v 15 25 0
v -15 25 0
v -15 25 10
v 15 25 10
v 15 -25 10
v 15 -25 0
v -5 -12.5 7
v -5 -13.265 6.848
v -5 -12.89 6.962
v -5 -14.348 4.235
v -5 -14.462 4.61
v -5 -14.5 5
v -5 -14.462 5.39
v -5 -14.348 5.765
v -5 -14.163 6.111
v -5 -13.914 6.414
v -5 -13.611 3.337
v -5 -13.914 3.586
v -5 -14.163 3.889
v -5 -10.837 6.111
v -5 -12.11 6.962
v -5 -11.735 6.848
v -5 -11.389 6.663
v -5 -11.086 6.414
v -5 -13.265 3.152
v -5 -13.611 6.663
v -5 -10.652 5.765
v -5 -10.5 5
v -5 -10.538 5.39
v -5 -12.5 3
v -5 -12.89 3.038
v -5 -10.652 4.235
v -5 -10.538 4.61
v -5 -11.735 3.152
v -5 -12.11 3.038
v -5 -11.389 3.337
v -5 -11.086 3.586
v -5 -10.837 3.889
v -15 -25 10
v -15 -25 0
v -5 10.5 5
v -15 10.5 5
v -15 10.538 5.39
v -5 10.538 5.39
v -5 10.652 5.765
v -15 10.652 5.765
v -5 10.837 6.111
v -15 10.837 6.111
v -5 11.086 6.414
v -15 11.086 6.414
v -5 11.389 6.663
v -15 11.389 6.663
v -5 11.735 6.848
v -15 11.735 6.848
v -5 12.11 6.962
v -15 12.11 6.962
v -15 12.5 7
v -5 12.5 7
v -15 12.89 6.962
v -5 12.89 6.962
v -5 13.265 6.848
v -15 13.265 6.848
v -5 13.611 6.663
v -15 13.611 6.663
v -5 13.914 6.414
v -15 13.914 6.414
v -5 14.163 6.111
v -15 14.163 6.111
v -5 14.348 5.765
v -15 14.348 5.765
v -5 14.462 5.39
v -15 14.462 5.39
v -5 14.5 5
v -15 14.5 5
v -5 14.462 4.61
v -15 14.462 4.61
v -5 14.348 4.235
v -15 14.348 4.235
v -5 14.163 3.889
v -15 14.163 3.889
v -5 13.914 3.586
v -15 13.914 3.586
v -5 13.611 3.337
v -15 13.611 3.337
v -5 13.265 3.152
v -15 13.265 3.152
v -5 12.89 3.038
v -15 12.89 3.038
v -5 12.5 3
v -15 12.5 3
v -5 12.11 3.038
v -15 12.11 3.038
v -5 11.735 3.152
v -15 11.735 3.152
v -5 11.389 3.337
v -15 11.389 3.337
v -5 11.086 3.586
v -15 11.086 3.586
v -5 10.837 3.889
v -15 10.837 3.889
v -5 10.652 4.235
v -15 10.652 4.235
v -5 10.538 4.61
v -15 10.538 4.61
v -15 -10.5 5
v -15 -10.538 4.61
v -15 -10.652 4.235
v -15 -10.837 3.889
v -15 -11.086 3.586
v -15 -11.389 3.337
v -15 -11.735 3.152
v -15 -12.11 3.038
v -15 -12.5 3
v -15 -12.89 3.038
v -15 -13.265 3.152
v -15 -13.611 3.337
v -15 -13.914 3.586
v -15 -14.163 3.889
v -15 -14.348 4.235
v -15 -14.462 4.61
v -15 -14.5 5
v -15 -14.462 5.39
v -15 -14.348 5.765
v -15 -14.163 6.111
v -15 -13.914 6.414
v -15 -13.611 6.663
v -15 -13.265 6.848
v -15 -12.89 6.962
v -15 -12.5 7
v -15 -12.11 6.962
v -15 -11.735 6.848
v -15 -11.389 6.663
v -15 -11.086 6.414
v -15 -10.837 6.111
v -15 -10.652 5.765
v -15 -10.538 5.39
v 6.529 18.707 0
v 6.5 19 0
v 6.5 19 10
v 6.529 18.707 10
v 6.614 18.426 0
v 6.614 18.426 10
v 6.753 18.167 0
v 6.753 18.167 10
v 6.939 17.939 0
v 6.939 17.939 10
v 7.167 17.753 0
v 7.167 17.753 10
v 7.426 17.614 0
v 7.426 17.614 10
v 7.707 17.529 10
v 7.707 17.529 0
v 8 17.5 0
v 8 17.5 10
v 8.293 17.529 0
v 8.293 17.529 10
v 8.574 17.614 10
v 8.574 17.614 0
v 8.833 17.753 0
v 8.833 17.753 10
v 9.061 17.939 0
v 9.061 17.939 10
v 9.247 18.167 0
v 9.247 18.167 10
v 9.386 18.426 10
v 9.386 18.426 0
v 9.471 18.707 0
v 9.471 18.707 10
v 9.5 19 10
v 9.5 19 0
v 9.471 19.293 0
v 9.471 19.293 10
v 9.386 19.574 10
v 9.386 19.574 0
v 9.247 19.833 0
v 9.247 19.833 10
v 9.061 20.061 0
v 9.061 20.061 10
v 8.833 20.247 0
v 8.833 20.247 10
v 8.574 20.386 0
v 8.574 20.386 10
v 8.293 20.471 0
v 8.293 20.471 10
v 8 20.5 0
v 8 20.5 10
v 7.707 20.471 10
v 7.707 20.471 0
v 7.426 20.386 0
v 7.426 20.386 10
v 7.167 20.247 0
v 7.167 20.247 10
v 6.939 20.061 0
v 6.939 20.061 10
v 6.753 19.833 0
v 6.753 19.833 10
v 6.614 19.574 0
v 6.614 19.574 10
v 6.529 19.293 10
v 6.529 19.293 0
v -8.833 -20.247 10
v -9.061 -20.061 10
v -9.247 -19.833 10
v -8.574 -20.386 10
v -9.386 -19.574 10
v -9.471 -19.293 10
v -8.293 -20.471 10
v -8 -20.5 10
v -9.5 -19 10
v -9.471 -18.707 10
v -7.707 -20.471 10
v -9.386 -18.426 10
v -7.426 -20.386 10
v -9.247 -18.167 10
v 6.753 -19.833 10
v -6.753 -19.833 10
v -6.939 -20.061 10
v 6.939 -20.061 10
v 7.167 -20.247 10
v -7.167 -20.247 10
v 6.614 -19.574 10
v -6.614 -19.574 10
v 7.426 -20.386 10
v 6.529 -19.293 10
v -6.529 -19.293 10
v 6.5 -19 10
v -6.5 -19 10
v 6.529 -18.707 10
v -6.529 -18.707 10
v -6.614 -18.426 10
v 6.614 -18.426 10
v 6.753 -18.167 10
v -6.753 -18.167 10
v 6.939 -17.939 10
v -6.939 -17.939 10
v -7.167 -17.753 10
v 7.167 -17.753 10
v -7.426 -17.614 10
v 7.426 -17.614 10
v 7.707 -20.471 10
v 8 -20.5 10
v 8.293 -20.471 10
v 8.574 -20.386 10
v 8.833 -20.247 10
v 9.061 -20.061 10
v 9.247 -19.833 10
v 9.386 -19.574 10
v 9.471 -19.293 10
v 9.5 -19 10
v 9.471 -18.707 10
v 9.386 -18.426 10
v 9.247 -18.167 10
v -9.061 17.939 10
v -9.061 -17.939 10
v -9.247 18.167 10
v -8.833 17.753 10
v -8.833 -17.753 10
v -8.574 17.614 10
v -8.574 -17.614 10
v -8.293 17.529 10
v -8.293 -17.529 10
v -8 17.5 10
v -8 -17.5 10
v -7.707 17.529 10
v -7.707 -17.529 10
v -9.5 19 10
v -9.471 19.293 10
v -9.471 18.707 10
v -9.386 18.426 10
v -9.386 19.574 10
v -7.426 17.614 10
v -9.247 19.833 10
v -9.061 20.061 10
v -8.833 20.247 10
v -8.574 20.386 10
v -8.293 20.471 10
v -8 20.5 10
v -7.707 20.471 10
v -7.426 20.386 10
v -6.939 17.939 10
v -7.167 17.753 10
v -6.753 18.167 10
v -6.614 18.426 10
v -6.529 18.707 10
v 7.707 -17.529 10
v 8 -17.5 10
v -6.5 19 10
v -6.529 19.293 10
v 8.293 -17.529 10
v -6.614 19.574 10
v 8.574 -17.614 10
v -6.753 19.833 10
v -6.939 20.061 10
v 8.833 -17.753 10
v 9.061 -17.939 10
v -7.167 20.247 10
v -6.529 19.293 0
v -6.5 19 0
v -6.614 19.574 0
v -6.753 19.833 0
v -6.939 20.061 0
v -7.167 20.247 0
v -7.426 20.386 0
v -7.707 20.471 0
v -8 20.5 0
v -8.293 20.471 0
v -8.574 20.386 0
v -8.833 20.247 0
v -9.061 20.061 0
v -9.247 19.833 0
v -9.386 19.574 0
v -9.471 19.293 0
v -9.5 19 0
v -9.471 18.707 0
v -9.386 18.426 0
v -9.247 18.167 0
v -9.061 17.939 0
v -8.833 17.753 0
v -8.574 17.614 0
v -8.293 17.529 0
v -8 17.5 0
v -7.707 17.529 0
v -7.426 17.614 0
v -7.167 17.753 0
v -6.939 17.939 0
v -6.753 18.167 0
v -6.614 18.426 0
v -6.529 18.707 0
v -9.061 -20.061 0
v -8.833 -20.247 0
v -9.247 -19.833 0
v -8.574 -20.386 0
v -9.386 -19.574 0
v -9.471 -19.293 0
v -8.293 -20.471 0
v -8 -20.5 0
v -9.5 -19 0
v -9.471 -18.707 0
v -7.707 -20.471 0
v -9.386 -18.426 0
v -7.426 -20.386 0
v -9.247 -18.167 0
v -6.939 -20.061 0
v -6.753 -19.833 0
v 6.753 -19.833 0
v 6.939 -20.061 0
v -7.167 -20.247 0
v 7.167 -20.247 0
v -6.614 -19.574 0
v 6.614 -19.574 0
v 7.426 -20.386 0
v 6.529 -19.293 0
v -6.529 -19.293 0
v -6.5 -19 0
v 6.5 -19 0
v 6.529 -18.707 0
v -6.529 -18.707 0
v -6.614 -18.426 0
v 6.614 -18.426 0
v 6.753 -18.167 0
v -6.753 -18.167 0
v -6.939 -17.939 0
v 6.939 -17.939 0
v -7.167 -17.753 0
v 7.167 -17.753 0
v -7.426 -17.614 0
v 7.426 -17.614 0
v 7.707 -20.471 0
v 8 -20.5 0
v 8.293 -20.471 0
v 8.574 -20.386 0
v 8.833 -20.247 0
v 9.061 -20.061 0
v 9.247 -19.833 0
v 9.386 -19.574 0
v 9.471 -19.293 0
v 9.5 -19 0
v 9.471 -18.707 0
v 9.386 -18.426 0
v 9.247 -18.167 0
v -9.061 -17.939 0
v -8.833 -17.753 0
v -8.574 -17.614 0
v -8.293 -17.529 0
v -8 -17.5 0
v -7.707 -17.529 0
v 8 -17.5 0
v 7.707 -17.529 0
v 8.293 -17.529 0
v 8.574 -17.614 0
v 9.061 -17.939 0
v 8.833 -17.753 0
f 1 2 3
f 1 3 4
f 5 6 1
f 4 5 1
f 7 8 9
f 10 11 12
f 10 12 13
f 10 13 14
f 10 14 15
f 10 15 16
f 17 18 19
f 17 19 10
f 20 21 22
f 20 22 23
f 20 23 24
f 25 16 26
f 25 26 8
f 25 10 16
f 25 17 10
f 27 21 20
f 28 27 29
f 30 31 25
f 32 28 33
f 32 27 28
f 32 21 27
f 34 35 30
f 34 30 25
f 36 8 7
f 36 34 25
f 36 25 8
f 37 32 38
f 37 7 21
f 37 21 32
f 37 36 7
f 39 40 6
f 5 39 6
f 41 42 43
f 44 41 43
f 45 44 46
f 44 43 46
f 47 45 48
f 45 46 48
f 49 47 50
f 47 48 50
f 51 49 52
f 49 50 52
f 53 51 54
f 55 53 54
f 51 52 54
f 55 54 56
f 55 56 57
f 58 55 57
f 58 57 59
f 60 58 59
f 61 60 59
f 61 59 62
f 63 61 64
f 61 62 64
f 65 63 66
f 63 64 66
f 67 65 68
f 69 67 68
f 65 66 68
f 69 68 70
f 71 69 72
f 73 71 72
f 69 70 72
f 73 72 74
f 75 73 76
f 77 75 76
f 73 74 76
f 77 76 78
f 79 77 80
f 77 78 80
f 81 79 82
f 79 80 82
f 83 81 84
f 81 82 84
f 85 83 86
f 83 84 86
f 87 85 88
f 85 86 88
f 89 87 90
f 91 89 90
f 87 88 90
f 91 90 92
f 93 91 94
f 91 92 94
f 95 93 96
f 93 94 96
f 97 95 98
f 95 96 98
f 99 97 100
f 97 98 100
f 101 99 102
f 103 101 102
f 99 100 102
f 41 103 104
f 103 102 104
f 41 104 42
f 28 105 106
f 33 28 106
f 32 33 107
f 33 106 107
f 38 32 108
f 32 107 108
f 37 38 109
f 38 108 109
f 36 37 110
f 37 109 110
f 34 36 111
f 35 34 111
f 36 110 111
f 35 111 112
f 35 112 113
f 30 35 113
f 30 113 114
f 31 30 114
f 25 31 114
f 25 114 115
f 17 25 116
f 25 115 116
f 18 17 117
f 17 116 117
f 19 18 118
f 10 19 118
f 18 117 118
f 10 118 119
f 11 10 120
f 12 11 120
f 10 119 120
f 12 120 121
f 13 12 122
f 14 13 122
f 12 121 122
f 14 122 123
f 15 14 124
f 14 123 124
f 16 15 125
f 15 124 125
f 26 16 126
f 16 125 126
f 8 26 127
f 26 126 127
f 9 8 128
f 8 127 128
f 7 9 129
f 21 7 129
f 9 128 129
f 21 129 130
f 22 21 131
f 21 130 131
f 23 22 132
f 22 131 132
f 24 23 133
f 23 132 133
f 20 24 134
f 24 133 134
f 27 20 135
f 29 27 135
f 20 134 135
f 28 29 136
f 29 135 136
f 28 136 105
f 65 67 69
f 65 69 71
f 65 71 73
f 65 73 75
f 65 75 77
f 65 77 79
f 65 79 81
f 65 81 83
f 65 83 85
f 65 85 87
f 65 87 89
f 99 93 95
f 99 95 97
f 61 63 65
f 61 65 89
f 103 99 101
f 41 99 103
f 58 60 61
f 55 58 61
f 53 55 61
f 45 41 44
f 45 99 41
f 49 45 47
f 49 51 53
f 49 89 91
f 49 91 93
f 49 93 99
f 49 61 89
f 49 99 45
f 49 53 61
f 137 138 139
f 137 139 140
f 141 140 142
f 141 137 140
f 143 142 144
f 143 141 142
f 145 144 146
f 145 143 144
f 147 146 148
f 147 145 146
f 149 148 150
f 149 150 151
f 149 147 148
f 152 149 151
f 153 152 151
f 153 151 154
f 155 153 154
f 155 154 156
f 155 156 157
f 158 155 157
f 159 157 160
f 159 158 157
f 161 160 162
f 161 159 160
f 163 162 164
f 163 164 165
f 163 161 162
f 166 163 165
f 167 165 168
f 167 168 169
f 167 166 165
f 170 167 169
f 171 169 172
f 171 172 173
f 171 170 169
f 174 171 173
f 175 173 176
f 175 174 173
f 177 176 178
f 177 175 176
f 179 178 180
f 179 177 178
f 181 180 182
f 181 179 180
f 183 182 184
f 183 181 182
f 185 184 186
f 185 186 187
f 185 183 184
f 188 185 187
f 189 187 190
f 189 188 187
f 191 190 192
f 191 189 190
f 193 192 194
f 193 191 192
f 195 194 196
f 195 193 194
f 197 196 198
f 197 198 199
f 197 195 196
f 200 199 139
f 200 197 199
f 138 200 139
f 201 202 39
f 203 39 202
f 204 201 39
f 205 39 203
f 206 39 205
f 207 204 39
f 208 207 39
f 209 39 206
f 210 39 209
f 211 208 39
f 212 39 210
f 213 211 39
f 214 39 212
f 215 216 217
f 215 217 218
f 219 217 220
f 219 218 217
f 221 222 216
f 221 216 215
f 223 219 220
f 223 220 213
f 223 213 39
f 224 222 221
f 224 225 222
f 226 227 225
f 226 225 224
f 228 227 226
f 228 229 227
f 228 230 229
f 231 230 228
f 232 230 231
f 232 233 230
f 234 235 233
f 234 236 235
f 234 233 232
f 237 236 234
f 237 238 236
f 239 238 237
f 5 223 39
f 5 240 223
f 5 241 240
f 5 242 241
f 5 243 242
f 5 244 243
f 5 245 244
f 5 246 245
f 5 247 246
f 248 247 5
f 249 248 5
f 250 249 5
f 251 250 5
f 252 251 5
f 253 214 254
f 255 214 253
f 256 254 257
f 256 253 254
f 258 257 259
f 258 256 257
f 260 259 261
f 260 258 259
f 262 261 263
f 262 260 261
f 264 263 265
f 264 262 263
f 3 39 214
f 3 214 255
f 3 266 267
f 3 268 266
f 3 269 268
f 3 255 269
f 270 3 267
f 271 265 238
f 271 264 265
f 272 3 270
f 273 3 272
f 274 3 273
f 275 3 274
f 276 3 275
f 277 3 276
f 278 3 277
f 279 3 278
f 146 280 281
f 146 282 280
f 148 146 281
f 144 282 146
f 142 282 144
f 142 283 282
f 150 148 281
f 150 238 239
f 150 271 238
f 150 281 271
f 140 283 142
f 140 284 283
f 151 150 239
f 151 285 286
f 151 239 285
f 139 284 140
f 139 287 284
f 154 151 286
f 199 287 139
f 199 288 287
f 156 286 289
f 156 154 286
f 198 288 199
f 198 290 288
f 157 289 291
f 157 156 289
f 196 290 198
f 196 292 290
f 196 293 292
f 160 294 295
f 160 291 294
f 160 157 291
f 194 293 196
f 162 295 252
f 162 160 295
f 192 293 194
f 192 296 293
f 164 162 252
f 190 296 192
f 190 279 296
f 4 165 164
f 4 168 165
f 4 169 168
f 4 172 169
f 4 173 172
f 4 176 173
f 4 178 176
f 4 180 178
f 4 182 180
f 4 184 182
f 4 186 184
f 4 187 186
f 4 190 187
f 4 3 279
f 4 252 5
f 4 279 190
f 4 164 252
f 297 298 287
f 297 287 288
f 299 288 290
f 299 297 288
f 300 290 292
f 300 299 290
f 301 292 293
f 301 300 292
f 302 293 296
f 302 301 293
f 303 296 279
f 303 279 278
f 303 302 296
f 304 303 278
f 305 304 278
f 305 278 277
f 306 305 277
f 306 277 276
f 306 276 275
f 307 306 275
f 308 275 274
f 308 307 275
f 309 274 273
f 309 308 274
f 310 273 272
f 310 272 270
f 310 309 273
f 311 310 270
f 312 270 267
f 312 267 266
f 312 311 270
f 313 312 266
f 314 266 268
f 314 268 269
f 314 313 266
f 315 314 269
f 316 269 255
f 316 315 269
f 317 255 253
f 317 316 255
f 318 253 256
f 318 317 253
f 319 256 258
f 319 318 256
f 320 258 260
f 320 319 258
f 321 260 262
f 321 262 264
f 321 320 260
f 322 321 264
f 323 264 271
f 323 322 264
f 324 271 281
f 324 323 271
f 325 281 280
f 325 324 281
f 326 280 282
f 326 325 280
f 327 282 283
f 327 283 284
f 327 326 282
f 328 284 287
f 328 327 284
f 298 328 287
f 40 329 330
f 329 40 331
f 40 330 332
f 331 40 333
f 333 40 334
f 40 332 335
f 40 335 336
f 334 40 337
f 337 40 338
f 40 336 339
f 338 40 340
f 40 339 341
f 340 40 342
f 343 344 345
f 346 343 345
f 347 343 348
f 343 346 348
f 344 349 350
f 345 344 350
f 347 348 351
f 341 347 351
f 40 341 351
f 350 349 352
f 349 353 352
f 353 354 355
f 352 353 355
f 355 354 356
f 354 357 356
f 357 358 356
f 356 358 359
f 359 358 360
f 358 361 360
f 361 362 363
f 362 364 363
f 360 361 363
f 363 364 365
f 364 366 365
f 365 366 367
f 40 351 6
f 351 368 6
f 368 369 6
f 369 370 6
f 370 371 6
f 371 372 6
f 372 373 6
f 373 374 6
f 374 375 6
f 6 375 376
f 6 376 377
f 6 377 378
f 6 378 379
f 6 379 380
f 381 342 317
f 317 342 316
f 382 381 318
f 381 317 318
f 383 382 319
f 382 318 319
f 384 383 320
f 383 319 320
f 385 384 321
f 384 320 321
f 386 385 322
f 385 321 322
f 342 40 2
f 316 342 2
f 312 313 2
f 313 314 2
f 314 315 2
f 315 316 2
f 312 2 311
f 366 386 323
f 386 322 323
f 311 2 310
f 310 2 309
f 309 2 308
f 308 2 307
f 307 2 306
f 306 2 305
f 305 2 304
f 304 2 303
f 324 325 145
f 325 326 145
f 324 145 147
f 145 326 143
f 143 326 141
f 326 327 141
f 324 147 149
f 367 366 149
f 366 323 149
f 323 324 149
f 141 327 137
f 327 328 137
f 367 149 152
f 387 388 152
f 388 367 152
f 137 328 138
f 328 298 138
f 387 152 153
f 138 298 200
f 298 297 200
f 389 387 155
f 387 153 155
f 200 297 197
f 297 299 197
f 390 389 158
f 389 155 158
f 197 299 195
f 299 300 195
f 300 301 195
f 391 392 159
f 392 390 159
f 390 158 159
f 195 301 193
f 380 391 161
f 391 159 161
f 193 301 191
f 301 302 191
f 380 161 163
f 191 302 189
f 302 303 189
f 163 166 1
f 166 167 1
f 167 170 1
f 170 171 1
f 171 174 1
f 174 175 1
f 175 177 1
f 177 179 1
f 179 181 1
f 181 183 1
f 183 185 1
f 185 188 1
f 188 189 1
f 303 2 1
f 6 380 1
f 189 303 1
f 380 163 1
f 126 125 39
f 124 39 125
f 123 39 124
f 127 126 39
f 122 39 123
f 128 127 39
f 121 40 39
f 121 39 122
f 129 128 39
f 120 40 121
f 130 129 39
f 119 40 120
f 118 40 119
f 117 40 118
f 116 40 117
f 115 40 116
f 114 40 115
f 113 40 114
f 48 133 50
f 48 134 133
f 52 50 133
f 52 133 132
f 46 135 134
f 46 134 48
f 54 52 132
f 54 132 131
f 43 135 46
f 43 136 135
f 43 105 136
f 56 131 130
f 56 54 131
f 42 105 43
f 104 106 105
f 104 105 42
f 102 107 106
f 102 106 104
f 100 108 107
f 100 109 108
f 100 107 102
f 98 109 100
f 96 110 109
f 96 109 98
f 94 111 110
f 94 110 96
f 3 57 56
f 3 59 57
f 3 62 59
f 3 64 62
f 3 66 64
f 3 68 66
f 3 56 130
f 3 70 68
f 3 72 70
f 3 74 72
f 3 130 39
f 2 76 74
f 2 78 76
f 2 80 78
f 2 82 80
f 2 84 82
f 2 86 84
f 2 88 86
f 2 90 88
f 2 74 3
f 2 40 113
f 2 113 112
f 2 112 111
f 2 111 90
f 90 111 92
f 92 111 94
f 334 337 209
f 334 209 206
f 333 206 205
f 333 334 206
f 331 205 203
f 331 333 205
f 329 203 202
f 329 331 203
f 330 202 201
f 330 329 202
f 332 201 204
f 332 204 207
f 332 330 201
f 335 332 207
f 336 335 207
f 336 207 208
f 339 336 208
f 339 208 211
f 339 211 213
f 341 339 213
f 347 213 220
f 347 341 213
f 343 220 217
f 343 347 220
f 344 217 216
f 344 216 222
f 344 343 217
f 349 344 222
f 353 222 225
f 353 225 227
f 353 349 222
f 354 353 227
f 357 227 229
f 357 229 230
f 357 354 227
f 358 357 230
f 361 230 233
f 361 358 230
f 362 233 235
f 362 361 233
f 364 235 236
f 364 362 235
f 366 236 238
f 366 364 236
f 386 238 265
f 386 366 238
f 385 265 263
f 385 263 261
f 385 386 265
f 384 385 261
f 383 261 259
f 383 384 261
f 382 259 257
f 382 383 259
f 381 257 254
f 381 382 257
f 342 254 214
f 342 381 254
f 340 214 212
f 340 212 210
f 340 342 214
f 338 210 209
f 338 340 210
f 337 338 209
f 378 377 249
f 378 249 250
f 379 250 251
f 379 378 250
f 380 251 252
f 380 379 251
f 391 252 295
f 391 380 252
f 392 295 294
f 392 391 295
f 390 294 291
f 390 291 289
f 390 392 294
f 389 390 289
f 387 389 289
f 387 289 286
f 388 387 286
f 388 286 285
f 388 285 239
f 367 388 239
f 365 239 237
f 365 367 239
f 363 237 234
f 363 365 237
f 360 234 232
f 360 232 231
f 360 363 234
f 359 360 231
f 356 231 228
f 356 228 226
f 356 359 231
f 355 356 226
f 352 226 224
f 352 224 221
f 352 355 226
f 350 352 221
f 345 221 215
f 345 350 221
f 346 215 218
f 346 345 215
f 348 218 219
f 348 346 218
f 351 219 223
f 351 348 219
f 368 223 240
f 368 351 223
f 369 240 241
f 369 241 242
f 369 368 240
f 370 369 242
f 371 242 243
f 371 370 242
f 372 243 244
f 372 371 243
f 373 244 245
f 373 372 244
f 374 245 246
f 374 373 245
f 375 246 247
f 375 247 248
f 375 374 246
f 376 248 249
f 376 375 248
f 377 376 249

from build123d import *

# Parameters (mm, degrees)
SKETCH1_W           = 30
SKETCH1_H           = 50
SKETCH1_R           = 1.5
BOSS_EXTRUDE1_DEPTH = 10
SKETCH3_R           = 2
CUT_EXTRUDE1_DEPTH  = 10


with BuildPart() as part:
    # Sketch1 → Boss-Extrude1 (new body)
    with BuildSketch(Plane.XY):
        Rectangle(SKETCH1_W, SKETCH1_H)
        with Locations((-8, 19)):
            Circle(SKETCH1_R, mode=Mode.SUBTRACT)
        with Locations(Location((8, 19, 0), (0, 0, 180))):
            Circle(SKETCH1_R, mode=Mode.SUBTRACT)
        with Locations((8, -19)):
            Circle(SKETCH1_R, mode=Mode.SUBTRACT)
        with Locations(Location((-8, -19, 0), (0, 0, 180))):
            Circle(SKETCH1_R, mode=Mode.SUBTRACT)
    extrude(amount=BOSS_EXTRUDE1_DEPTH)

    # Sketch3 → Cut-Extrude1 (cut)
    with BuildSketch(Plane.ZY.offset(15)):
        with Locations(Location((5, 12.5, 0), (0, 0, 270))):
            Circle(SKETCH3_R)
        with Locations(Location((5, -12.5, 0), (0, 0, 90))):
            Circle(SKETCH3_R)
    extrude(amount=-CUT_EXTRUDE1_DEPTH, mode=Mode.SUBTRACT)


solid = part.part
